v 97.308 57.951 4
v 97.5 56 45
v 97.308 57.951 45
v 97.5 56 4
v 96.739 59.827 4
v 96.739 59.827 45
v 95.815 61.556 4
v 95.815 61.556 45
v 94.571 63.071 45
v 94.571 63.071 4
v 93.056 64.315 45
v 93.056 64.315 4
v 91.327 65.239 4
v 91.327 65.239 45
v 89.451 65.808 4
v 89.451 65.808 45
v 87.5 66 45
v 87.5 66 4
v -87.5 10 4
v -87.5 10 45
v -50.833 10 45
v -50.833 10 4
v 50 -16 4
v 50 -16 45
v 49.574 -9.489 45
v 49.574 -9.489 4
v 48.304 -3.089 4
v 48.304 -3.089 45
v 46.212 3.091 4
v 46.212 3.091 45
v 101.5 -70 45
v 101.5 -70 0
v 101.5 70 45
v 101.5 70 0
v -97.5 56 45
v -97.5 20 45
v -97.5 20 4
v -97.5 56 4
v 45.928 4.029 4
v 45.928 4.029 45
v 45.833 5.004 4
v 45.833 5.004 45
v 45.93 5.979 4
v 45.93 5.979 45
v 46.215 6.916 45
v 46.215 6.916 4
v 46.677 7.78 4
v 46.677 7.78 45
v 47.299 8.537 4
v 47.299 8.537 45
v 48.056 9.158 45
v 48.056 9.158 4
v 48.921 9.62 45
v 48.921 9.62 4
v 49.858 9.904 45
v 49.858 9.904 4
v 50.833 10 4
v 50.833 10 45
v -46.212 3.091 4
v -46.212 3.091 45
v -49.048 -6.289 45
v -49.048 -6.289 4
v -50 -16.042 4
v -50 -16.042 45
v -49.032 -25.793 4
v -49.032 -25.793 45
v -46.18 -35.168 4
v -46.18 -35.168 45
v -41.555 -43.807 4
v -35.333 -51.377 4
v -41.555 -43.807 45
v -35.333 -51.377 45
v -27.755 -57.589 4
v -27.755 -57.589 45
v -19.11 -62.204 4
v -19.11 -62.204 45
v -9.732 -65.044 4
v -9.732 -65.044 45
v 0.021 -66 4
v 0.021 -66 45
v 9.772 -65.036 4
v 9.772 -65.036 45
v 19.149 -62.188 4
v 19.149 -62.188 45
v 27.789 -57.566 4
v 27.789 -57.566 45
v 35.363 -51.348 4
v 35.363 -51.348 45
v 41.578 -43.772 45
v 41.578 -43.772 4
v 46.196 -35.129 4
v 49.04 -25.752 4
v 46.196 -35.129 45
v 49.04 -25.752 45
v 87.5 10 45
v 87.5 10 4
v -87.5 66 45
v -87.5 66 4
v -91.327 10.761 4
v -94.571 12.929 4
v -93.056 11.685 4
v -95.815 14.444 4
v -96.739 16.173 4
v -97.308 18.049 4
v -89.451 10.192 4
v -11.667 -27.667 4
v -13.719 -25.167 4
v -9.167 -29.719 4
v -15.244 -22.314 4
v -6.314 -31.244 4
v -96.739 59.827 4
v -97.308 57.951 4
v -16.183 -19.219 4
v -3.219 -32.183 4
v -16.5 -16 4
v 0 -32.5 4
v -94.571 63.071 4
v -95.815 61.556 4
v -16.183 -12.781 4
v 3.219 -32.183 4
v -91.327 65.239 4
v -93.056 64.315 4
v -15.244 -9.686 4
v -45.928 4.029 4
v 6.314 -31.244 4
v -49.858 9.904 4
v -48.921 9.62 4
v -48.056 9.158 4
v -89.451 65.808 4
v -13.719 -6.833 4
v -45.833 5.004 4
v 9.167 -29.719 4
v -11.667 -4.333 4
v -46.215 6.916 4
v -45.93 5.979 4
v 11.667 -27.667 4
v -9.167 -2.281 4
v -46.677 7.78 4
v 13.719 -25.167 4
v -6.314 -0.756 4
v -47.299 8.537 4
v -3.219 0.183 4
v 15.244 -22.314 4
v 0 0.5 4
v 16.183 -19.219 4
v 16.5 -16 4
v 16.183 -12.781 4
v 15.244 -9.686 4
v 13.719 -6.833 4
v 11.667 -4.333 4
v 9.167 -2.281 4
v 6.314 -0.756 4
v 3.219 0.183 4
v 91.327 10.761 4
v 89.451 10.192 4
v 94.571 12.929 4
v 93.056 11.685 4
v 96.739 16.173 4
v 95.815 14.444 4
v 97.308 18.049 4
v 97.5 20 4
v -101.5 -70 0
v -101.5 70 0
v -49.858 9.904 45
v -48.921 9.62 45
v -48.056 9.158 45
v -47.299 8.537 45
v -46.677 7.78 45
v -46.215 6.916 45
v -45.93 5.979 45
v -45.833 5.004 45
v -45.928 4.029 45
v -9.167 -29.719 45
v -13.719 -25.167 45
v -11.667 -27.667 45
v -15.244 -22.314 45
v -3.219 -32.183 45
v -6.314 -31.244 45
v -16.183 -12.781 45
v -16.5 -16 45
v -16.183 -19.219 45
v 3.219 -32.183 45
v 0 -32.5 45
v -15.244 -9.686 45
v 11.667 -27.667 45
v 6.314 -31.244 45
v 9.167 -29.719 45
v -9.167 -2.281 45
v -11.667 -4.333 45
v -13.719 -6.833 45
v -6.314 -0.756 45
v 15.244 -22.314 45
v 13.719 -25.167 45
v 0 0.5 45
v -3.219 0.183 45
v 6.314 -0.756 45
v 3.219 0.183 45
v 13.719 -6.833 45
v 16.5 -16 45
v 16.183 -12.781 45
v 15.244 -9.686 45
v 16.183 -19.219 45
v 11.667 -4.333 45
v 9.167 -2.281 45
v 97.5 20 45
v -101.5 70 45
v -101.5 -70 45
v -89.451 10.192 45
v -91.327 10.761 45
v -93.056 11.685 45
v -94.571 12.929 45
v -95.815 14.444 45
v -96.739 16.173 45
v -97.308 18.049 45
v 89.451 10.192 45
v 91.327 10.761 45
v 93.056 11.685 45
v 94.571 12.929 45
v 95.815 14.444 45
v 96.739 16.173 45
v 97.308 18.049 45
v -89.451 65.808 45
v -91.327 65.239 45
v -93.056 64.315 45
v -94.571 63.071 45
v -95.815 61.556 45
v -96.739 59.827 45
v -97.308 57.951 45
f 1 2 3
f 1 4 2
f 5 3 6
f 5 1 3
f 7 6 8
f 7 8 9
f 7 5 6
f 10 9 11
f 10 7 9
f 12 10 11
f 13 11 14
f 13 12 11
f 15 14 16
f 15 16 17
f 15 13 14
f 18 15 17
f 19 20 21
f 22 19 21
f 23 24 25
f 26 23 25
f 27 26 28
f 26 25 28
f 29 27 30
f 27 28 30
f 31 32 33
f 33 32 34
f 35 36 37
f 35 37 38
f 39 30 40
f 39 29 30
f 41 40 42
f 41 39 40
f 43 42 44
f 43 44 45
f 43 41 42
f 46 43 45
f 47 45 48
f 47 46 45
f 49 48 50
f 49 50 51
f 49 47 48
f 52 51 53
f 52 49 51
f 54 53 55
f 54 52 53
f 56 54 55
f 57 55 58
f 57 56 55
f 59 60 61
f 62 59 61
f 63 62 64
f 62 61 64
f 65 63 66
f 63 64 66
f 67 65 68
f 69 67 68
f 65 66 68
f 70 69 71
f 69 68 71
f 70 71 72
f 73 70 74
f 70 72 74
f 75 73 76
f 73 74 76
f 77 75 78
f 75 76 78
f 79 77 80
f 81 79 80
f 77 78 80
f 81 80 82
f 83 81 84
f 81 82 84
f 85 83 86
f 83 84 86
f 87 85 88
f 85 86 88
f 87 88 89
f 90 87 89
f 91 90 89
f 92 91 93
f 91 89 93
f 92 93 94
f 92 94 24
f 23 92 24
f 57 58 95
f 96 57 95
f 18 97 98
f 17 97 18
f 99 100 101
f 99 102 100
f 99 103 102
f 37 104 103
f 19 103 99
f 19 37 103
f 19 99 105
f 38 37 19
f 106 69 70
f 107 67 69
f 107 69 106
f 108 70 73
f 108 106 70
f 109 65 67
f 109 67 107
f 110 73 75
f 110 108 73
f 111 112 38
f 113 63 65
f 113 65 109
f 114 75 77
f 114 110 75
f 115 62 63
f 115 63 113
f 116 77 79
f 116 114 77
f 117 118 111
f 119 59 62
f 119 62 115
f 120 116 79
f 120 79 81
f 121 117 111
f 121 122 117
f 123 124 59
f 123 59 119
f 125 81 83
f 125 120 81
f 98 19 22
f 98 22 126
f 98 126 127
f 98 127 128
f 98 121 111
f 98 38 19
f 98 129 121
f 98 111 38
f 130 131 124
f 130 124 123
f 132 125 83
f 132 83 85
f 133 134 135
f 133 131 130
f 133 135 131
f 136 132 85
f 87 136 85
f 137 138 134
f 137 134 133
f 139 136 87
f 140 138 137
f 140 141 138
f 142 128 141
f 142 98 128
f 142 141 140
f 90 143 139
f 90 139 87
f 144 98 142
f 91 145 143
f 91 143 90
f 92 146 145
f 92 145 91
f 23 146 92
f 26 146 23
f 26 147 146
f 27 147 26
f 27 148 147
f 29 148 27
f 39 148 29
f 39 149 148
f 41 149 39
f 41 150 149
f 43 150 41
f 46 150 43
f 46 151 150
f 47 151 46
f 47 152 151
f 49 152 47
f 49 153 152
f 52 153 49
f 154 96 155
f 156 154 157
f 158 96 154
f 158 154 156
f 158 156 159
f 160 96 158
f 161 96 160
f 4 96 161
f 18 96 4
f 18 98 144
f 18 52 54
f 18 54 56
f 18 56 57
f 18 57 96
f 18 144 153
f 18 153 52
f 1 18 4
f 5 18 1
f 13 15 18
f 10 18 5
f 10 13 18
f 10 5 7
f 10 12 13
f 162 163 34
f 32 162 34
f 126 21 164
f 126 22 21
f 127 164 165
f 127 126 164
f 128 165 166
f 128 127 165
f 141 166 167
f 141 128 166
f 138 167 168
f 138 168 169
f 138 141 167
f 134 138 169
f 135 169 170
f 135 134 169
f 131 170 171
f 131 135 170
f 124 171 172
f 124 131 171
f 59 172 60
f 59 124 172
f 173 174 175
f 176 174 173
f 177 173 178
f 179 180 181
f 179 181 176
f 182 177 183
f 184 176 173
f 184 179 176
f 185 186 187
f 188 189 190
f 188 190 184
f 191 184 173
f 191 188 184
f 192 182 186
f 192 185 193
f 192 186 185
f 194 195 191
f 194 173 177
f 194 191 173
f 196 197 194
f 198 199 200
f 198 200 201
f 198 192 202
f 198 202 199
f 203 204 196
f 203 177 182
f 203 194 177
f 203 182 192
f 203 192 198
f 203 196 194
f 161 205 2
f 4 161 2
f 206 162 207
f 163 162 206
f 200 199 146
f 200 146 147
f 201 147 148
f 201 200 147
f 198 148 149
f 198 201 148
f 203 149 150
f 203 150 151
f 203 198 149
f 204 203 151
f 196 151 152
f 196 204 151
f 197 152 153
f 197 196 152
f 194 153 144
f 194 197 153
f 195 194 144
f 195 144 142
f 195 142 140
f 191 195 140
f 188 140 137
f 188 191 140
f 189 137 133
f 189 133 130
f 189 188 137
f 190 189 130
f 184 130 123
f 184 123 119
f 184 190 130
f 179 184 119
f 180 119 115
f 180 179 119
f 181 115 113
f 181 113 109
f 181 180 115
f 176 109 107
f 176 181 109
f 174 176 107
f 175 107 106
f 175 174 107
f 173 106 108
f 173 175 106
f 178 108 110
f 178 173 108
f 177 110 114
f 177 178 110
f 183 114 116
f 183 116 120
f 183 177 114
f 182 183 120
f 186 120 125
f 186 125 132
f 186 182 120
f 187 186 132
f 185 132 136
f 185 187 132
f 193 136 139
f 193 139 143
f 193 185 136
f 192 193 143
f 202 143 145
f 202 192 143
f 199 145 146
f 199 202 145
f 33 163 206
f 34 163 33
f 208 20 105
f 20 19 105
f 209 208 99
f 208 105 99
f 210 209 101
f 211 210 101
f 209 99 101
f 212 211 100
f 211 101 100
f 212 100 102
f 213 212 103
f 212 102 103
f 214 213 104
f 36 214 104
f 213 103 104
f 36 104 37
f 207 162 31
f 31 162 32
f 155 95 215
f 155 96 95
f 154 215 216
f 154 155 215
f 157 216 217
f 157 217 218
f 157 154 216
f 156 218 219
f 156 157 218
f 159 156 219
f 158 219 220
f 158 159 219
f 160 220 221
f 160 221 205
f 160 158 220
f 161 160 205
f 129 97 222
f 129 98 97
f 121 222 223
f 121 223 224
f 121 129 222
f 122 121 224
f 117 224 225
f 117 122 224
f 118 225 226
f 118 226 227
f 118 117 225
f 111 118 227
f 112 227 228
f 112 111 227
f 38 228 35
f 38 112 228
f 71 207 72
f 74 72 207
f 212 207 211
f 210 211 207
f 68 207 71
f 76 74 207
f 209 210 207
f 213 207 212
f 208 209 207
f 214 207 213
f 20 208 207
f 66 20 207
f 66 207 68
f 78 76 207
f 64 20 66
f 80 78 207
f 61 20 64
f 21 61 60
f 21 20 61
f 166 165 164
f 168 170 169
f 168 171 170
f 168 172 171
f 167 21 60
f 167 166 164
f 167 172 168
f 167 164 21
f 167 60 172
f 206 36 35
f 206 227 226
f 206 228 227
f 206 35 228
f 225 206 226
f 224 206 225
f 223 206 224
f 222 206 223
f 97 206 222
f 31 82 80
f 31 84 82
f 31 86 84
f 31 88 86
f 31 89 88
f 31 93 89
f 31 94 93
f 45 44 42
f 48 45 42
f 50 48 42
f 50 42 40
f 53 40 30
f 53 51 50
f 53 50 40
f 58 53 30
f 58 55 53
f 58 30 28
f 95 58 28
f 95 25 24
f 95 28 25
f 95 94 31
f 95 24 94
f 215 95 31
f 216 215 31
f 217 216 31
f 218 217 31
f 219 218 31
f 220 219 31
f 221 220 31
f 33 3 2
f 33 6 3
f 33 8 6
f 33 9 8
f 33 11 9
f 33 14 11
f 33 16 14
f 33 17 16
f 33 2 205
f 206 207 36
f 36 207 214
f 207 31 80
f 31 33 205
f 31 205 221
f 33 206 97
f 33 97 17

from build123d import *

# Parameters (mm, degrees)
F0_W     = 203
F0_H     = 140
F1_DEPTH = 45
F2_W     = 195
F2_H     = 56
F3_DEPTH = 41
F4_R     = 16.5
F5_DEPTH = 41
F6_R     = 10
F7_R     = 5


with BuildPart() as f1:
    # F0 (on Top) → F1 (new body)
    with BuildSketch(Plane.XY):
        Rectangle(F0_W, F0_H)
    extrude(amount=F1_DEPTH)

    # F2 (on face) → F3 (cut)
    with BuildSketch(Plane.XY.offset(45)):
        with Locations((0, 38)):
            Rectangle(F2_W, F2_H)
    extrude(amount=-F3_DEPTH, mode=Mode.SUBTRACT)

    # F4 (on face) → F5 (cut)
    with BuildSketch(Plane.XY.offset(45)):
        with BuildLine():
            ThreePointArc((-42.7083130081, 10), (-13.5015619392, -64.1425780905), (50, -16))
            ThreePointArc((50, -16), (48.1425780905, -2.4984380608), (42.7083130081, 10))
            Line((42.7083130081, 10), (-42.7083130081, 10))
        make_face()
        with Locations((0, -16)):
            Circle(F4_R, mode=Mode.SUBTRACT)
    extrude(amount=-F5_DEPTH, mode=Mode.SUBTRACT)

    # F6
    f6_edges = [f1.edges().sort_by_distance(p)[0] for p in [
        (97.5, 66, 24.5),
        (-97.5, 66, 24.5),
        (97.5, 10, 24.5),
        (-97.5, 10, 24.5),
    ]]
    fillet(f6_edges, radius=F6_R)

    # F7
    f7_edges = [f1.edges().sort_by_distance(p)[0] for p in [
        (42.708313, 10, 24.5),
        (-42.708313, 10, 24.5),
    ]]
    fillet(f7_edges, radius=F7_R)


solid = f1.part
